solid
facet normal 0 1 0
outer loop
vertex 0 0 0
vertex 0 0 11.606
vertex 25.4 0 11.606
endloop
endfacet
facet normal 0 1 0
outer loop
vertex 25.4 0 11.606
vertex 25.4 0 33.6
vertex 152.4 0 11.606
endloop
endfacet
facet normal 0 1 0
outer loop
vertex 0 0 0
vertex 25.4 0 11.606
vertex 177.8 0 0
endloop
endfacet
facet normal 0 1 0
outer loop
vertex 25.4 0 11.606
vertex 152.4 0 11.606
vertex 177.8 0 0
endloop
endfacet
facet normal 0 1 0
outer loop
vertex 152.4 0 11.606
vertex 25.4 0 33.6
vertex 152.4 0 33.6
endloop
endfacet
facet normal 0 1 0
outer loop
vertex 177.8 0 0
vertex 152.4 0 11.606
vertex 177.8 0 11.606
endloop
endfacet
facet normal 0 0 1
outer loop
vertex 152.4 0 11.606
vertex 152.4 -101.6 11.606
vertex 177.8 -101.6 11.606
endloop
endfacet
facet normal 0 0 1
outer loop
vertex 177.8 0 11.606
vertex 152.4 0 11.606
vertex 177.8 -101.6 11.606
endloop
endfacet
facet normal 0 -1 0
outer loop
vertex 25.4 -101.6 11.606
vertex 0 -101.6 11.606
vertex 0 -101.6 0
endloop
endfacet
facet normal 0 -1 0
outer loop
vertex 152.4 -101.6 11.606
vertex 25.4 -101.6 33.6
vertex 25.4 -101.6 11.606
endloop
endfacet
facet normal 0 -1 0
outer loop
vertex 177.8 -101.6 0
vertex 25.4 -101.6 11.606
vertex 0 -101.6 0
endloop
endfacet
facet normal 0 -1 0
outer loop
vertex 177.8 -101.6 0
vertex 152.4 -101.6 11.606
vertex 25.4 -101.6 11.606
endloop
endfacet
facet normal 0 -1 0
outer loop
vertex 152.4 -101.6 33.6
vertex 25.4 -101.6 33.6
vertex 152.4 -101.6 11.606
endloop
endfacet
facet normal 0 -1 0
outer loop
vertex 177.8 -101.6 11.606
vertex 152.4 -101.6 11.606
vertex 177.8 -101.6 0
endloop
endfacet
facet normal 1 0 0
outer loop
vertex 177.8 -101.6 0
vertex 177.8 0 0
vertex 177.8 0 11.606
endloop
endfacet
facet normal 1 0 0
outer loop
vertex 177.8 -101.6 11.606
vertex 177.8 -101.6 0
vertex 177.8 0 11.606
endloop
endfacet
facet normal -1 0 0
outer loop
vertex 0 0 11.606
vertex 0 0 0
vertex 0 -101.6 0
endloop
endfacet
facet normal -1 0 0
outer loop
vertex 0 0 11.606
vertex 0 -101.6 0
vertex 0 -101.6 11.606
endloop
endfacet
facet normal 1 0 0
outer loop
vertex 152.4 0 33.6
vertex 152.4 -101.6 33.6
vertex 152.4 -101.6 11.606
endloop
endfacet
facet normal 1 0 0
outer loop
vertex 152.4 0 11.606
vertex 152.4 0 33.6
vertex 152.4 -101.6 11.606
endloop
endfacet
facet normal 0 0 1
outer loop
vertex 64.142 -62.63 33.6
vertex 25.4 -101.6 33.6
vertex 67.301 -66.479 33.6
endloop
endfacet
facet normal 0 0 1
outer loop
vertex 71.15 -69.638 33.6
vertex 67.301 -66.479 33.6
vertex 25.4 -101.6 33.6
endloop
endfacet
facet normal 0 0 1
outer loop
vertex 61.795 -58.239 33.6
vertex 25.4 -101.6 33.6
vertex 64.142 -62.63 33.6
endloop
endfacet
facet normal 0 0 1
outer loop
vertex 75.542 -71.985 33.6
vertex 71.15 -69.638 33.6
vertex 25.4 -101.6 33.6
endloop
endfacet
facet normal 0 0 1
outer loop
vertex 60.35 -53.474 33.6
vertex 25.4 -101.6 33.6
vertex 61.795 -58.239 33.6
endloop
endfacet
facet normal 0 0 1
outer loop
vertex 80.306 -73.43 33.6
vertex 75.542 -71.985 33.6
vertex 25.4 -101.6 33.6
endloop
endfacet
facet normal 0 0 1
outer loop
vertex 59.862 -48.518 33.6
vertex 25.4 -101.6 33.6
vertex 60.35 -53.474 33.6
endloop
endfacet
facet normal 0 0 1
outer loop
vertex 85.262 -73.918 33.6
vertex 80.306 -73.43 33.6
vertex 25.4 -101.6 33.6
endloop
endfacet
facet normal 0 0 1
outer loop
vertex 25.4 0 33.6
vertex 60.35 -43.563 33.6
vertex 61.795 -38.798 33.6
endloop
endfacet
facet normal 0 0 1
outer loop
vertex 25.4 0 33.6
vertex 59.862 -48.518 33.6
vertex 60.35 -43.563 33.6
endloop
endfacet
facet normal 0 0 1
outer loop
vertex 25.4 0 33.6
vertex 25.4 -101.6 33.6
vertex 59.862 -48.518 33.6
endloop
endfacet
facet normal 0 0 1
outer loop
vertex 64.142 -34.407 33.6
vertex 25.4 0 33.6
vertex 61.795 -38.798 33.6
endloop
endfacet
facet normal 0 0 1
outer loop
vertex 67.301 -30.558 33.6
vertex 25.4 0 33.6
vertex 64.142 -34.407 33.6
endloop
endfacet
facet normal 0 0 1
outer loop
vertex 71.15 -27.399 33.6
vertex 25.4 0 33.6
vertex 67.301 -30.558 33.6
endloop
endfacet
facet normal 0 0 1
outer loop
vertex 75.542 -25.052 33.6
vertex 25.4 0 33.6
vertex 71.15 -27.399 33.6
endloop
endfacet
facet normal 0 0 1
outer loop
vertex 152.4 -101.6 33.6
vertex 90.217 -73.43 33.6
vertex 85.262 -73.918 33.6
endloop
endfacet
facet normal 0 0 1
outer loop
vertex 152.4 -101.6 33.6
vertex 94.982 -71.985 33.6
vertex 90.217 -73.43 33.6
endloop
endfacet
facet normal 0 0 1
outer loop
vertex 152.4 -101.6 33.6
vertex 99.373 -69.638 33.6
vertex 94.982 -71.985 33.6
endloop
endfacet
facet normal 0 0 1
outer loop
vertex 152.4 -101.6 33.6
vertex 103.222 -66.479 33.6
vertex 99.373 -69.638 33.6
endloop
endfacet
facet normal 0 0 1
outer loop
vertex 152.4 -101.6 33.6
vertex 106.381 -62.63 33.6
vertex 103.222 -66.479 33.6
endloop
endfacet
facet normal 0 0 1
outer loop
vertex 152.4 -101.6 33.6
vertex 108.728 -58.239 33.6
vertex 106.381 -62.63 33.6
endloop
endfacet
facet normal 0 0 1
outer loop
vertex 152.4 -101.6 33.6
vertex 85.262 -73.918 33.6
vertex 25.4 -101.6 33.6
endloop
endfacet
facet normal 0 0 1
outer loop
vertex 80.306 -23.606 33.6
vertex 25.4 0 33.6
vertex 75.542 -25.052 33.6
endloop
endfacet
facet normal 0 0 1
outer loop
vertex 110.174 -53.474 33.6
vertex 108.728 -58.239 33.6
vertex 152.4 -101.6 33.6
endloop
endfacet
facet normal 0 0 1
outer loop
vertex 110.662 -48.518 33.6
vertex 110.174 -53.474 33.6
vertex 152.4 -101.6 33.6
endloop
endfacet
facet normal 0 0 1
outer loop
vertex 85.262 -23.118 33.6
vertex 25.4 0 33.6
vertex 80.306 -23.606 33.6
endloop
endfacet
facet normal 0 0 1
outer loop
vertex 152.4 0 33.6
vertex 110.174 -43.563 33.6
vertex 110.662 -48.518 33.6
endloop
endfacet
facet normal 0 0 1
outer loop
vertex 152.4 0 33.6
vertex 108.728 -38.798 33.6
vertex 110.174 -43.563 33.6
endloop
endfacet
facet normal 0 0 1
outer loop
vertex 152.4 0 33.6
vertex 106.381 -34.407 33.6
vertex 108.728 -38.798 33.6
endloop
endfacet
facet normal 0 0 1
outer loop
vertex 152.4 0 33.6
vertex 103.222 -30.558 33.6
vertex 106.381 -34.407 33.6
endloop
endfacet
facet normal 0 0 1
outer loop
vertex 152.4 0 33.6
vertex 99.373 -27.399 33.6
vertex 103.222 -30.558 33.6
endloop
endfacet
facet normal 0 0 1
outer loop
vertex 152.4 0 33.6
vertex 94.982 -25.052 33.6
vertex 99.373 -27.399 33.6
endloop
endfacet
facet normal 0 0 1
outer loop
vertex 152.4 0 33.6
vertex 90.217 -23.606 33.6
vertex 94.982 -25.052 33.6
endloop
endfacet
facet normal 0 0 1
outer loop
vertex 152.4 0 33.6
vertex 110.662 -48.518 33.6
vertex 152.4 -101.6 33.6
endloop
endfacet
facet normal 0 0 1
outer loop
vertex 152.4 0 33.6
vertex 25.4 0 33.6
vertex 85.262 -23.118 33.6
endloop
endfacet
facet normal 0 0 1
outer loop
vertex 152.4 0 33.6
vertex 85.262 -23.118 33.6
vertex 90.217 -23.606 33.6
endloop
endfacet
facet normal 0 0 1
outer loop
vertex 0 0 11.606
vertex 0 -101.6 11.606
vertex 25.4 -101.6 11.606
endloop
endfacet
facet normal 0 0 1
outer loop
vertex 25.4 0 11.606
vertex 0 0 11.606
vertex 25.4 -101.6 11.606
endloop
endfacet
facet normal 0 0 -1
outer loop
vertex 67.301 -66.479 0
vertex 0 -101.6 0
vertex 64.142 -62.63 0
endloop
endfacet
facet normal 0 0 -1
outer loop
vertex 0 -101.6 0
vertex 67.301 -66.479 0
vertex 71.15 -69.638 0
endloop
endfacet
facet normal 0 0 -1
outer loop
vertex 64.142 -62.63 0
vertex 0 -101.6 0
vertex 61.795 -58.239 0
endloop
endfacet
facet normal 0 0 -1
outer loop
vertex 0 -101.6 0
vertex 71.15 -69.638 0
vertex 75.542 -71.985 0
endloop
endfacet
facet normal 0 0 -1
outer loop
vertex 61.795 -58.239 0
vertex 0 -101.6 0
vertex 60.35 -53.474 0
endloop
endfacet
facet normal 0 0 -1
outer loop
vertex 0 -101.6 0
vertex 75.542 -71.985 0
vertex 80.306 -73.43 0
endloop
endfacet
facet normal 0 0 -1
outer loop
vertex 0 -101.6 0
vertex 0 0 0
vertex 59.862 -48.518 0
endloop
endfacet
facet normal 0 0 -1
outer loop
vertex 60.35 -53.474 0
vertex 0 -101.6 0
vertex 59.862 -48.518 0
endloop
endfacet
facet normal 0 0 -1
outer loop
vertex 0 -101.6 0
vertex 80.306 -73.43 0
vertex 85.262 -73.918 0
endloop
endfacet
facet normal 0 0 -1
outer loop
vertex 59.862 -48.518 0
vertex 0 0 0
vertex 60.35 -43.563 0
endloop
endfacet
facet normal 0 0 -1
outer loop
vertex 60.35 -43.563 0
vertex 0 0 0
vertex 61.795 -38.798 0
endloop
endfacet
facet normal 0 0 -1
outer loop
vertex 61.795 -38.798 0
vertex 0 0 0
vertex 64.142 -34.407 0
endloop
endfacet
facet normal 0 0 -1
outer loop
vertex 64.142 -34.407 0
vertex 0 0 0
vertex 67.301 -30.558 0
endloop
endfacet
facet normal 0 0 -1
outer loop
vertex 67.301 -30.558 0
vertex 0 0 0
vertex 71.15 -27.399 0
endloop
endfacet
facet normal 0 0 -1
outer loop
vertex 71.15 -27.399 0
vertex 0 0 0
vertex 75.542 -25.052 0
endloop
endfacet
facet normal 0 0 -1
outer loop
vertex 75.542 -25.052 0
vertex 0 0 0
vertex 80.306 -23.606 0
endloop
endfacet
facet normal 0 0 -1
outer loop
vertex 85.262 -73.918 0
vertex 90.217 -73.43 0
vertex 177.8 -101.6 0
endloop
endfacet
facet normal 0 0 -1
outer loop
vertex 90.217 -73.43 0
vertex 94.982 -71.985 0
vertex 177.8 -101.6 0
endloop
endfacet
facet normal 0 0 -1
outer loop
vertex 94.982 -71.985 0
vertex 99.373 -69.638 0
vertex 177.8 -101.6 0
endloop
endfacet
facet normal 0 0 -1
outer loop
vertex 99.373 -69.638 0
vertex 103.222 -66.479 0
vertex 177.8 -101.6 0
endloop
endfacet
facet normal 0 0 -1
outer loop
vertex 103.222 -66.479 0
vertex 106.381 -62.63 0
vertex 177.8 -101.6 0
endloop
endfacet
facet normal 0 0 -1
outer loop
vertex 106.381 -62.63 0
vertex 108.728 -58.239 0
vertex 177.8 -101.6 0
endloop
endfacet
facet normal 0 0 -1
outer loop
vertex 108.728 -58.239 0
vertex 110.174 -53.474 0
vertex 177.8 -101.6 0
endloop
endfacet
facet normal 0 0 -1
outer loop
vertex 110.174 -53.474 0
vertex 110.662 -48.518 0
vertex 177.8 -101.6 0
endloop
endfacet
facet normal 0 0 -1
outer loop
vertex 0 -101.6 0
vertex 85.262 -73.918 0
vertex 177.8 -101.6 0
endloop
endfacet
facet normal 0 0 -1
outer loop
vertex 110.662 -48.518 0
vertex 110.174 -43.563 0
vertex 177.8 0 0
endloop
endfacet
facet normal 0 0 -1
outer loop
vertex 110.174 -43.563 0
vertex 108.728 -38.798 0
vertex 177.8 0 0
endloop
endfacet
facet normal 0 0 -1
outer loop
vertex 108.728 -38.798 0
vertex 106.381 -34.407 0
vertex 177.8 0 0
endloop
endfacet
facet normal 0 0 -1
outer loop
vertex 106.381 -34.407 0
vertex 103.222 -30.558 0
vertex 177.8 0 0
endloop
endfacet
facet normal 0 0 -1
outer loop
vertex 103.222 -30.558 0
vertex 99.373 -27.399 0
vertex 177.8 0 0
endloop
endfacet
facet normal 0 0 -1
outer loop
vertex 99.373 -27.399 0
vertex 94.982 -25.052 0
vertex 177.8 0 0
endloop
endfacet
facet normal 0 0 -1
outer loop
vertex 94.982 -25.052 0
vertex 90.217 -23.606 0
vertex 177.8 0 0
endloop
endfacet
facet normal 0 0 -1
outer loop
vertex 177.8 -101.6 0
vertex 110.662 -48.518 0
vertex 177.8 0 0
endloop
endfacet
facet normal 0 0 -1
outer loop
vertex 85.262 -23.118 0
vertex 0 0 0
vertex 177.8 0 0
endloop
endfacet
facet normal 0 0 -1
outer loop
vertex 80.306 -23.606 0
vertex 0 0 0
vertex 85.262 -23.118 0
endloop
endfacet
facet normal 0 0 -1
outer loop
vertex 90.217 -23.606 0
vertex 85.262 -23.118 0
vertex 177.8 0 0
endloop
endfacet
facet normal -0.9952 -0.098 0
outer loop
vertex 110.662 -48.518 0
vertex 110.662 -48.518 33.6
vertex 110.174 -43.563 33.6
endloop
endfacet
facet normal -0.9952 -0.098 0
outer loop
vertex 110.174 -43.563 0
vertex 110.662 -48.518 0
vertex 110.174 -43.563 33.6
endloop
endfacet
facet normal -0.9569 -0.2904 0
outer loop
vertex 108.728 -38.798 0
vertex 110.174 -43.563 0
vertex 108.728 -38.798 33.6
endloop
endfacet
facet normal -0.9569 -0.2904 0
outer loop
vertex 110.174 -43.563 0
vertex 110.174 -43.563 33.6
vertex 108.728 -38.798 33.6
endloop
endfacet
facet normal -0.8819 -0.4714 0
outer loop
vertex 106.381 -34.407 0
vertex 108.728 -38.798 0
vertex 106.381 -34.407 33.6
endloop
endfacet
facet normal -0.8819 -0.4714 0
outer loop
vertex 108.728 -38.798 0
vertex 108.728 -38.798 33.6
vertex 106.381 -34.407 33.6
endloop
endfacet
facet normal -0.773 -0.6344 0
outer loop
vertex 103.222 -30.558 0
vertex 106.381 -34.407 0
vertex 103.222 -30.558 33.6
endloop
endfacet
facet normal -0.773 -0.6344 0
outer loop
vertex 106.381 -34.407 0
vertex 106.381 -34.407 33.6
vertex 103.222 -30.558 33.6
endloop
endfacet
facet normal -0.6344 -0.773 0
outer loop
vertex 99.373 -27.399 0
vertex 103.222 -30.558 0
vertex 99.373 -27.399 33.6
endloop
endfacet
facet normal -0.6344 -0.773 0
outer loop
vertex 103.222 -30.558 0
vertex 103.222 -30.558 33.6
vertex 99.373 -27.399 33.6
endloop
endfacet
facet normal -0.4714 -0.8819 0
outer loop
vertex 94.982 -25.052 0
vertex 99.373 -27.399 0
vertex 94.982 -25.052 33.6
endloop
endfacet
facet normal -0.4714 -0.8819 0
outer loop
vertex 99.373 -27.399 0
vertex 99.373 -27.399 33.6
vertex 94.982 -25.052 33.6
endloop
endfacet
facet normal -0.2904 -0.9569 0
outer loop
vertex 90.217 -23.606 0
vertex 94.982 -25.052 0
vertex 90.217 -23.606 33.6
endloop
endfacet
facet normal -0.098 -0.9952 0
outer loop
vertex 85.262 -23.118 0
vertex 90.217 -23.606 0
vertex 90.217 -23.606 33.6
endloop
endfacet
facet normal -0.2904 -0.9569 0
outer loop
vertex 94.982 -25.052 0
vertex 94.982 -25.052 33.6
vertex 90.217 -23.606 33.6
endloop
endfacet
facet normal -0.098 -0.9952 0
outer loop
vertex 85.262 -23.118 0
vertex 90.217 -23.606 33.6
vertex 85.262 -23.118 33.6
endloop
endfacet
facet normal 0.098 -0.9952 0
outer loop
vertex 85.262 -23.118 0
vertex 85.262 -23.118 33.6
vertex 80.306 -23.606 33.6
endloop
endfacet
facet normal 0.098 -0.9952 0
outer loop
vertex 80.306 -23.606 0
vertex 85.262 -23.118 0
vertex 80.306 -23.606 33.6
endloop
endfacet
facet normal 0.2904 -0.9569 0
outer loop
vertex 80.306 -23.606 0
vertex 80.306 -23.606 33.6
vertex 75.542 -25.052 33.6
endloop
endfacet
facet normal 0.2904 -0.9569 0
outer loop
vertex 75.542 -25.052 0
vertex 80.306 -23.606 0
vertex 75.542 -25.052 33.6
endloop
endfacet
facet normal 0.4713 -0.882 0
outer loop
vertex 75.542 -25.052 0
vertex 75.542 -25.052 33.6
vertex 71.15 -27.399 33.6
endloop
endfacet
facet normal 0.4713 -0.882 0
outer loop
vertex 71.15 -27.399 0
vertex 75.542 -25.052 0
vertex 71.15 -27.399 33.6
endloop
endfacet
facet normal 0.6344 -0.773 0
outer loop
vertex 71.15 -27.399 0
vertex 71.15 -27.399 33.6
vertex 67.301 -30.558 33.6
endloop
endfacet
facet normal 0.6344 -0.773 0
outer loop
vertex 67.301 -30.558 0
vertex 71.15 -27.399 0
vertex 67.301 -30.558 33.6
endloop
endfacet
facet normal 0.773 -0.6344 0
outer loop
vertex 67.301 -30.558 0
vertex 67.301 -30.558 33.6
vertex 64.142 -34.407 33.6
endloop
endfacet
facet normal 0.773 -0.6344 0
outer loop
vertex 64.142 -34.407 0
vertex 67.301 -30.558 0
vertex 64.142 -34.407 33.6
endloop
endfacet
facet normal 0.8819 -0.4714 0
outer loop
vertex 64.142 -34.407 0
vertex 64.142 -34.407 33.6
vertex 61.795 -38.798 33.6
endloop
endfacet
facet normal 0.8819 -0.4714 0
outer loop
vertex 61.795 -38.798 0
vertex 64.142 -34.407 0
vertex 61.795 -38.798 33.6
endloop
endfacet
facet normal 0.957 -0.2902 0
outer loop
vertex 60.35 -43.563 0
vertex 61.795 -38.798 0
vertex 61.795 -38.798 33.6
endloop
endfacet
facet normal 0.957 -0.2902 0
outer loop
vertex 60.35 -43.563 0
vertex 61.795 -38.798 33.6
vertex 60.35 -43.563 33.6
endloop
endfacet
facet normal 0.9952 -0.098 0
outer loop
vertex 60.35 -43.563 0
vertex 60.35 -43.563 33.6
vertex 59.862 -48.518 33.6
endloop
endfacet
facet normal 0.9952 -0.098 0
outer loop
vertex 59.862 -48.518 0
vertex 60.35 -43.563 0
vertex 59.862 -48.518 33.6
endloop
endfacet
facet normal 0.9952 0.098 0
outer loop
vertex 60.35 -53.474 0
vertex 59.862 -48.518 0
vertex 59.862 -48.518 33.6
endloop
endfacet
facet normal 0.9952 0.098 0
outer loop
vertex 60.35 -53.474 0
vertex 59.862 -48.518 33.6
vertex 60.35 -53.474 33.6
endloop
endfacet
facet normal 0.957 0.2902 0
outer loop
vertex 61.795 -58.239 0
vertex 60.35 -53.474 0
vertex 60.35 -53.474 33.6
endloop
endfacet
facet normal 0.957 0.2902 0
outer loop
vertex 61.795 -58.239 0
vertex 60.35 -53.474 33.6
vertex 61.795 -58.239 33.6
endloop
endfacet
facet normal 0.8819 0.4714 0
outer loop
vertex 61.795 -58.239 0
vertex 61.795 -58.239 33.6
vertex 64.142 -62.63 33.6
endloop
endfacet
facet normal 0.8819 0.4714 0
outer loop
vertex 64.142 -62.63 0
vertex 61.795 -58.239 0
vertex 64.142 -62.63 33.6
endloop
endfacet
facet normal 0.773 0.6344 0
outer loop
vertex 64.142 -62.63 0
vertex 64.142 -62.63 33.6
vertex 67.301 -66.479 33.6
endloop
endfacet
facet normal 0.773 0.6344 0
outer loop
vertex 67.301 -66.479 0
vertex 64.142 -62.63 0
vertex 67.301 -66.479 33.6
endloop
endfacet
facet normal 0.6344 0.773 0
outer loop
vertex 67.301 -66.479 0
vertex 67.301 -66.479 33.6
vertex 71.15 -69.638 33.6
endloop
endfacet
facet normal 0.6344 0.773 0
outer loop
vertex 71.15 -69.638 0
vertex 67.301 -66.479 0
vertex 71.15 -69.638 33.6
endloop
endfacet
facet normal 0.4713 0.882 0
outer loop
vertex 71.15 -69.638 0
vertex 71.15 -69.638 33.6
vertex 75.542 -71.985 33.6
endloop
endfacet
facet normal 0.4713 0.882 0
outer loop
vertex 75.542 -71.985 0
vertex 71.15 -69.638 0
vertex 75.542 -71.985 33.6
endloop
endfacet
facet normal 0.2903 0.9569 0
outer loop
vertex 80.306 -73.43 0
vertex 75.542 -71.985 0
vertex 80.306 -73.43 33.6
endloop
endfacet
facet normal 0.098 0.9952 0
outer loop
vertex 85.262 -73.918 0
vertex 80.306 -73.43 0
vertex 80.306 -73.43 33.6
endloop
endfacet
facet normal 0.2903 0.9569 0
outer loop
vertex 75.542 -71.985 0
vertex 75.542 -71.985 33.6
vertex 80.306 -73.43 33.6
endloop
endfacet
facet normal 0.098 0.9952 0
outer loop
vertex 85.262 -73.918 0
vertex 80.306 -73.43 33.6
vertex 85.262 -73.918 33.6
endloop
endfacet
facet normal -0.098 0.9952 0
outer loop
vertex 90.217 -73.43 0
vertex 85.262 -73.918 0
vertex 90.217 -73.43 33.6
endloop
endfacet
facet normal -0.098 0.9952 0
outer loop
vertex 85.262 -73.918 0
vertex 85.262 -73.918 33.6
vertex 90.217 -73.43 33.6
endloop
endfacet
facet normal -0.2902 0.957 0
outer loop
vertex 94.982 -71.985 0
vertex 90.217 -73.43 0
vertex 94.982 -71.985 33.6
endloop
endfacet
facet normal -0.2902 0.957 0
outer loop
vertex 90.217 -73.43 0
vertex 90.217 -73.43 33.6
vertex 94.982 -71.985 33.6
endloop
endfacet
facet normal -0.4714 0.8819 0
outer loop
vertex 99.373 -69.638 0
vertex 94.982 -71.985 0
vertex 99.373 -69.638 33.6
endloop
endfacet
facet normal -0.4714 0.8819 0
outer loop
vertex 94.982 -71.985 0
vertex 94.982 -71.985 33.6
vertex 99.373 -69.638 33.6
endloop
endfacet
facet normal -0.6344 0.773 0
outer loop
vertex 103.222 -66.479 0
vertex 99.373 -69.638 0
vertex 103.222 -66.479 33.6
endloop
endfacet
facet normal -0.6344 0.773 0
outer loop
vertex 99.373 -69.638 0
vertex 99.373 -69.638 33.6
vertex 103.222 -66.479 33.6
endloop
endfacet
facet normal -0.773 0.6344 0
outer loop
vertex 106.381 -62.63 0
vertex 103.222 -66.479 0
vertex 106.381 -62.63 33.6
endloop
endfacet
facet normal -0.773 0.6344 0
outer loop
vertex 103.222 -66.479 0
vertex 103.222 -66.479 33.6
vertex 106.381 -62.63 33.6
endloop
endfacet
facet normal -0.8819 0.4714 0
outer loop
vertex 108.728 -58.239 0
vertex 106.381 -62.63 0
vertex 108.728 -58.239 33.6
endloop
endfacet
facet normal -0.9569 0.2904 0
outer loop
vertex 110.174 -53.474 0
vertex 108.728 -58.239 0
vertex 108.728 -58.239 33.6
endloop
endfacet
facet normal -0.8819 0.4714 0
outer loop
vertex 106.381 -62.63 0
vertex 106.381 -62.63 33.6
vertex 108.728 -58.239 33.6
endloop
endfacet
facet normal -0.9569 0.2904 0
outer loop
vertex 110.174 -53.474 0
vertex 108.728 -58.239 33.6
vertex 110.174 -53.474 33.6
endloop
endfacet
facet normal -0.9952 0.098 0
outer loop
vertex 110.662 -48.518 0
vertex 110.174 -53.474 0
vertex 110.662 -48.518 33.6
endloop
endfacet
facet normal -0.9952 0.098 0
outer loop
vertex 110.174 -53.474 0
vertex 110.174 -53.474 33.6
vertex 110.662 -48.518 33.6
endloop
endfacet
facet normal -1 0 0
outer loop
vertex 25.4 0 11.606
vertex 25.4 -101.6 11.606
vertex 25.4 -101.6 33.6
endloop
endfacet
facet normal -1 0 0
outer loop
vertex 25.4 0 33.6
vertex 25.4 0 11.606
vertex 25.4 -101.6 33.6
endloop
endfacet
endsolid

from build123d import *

# Parameters (mm, degrees)
F0_W     = 177.8
F0_H     = 33.6000117971
F1_DEPTH = 101.6
F2_R     = 25.4
F3_DEPTH = 33.6010117971
F4_W     = 25.4
F4_H     = 21.9941446124
F5_DEPTH = 101.601


with BuildPart() as f1:
    # F0 (on Front) → F1 (new body)
    with BuildSketch(Plane.XZ):
        with Locations((88.9, 16.8000058986)):
            Rectangle(F0_W, F0_H)
    extrude(amount=F1_DEPTH)

    # F2 (on face) → F3 (cut, through all)
    with BuildSketch(Plane.XY.offset(33.6000117971)):
        with Locations((85.2616652846, -48.5184304416)):
            Circle(F2_R)
    extrude(amount=-F3_DEPTH, mode=Mode.SUBTRACT)

    # F4 (on face) → F5 (cut, through all)
    with BuildSketch(Plane.XZ.offset(101.6)):
        Polygon((177.8, 11.6058671847), (177.8, 33.6000117971), (159.5585218906, 33.6000117971), (152.4, 33.6000117971), (152.4, 11.6058671847), align=None)
        with Locations((12.7, 22.6029394909)):
            Rectangle(F4_W, F4_H)
    extrude(amount=-F5_DEPTH, mode=Mode.SUBTRACT)


solid = f1.part
